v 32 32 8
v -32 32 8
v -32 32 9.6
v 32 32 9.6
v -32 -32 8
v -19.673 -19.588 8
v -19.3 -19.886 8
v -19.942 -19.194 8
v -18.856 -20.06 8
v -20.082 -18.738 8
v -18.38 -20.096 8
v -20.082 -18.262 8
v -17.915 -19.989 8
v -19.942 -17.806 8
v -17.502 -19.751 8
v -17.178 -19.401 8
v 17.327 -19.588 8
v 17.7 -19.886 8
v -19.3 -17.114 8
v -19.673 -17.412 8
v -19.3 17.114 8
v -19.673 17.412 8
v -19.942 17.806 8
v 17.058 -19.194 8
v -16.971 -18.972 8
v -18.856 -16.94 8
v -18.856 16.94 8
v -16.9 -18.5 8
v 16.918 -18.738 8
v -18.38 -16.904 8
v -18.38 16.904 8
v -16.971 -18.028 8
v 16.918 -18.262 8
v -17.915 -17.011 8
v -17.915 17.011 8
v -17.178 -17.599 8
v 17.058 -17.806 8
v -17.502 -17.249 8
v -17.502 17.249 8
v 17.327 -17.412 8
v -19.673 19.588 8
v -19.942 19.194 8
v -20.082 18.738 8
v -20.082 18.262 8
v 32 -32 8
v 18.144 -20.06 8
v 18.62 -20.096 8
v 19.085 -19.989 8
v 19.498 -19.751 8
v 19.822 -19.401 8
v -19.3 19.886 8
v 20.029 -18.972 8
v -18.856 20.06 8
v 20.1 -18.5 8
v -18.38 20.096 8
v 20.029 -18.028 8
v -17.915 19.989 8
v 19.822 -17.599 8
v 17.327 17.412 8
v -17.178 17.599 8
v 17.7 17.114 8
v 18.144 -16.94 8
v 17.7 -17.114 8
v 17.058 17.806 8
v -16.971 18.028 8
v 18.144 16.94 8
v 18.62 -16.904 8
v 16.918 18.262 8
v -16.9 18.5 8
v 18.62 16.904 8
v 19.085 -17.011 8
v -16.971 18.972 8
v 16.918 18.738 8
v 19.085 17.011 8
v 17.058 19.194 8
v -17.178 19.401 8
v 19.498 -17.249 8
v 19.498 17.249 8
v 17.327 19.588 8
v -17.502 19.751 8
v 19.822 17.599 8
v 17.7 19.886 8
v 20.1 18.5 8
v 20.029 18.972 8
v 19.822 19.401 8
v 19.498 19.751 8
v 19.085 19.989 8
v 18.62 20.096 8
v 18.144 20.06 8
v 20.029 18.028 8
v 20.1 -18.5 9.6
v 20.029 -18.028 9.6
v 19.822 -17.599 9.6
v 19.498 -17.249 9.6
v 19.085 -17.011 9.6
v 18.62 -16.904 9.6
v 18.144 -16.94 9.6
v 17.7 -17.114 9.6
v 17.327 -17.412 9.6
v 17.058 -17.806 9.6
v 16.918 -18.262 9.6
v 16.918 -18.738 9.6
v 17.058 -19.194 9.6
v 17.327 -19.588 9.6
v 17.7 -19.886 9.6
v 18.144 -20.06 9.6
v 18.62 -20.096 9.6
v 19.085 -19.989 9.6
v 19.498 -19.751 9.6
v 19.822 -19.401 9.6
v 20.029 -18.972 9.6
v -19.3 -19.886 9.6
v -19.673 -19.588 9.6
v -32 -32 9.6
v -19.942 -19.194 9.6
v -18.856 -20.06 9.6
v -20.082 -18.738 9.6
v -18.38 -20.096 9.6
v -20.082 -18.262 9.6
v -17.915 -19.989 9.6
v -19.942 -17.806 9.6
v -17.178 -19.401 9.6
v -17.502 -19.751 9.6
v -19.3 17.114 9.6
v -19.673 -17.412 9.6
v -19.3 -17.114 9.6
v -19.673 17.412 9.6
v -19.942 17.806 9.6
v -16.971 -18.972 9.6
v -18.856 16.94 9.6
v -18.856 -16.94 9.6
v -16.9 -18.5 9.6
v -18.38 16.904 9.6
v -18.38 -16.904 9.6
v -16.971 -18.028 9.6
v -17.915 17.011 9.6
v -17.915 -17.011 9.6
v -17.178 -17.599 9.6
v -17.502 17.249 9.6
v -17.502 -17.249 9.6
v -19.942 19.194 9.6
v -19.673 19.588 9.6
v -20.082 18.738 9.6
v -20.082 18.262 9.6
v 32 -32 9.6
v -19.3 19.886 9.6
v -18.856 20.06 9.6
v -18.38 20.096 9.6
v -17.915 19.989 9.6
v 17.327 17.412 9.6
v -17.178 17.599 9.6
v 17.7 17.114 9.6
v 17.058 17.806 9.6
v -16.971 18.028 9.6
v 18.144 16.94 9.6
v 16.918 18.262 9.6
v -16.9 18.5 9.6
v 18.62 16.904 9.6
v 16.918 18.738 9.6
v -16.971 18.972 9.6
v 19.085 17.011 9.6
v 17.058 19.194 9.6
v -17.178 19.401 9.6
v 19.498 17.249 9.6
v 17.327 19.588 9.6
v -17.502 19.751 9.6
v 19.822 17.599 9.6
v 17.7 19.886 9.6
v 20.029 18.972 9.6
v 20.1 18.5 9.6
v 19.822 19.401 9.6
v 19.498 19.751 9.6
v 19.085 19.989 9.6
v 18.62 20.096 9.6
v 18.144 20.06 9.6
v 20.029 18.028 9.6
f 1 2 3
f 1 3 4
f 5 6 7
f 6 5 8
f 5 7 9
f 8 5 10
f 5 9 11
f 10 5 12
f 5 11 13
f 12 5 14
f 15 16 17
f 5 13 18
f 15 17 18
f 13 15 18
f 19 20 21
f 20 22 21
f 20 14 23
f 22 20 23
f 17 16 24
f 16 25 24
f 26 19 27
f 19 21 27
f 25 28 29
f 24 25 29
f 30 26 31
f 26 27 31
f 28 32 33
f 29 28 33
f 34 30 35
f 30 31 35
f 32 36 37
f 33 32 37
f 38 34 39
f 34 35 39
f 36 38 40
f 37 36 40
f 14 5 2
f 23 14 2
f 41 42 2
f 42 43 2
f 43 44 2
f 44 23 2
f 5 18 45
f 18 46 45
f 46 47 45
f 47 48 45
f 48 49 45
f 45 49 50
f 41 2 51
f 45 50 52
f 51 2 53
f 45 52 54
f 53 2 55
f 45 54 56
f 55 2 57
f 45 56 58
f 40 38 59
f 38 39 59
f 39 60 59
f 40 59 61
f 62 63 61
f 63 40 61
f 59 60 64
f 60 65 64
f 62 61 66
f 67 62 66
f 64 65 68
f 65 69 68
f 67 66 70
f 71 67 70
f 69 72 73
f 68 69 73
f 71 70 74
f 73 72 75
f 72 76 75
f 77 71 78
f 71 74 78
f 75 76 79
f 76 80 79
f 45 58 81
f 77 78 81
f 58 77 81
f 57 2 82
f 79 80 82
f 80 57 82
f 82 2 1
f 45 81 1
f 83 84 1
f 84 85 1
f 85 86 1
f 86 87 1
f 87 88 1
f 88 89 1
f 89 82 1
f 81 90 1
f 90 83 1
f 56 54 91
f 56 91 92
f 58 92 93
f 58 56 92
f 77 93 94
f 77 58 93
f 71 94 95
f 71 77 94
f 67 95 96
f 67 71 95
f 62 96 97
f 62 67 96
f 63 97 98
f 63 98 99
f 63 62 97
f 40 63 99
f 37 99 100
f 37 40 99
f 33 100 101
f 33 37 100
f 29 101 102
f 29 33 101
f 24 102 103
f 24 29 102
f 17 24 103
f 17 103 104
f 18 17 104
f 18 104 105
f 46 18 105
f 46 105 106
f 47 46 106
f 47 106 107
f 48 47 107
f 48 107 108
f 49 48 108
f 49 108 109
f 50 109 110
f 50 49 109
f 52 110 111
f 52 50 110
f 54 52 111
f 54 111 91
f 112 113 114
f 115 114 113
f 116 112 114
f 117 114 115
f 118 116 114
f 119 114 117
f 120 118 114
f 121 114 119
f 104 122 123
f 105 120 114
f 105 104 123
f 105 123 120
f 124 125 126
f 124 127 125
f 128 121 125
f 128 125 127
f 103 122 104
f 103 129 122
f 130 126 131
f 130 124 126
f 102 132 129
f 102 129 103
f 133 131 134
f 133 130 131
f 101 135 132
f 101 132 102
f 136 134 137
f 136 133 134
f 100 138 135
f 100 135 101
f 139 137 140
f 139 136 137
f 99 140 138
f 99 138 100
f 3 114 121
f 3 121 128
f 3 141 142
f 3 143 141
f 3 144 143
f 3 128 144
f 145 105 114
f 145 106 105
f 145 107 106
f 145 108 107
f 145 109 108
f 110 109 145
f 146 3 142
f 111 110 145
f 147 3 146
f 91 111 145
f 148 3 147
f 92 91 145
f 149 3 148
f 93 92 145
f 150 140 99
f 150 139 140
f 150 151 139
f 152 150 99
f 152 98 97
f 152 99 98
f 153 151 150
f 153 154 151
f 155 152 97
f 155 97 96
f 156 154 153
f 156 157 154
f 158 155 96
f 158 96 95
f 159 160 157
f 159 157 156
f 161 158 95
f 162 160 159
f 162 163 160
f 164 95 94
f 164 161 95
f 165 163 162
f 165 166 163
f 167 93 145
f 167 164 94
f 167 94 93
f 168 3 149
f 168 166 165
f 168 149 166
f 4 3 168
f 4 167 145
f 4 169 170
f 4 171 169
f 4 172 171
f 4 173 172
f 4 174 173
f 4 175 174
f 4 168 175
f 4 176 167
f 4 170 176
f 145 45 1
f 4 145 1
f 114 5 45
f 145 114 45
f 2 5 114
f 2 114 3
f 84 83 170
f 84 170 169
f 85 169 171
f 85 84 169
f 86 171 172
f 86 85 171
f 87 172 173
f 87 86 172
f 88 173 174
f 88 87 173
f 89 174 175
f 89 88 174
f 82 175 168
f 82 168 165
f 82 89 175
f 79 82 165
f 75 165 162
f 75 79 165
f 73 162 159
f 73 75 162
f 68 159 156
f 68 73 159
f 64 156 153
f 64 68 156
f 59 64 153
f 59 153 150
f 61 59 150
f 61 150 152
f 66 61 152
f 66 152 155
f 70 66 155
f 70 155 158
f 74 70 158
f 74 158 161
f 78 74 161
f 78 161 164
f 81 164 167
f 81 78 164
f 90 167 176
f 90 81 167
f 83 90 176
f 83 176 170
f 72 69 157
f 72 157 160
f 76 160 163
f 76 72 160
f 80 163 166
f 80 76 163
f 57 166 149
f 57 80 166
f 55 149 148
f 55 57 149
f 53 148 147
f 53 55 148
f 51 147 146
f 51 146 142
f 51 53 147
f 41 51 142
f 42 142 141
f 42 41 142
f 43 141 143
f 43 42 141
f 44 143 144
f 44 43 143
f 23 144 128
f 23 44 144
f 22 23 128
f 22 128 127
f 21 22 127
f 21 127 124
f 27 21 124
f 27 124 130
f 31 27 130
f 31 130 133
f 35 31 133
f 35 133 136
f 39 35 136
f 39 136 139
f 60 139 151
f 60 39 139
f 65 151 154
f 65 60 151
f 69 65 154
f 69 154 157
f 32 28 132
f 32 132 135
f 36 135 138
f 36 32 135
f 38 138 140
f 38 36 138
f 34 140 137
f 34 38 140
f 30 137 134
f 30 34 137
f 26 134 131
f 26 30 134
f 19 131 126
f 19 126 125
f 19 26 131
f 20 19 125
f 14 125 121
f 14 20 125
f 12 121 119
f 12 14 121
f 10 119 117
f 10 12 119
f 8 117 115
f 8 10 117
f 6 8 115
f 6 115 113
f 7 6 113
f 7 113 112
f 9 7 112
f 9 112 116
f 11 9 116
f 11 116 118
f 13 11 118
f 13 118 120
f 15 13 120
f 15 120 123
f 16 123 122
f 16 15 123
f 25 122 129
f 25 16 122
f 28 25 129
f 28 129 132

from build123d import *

# Parameters (mm, degrees)
PCB_1_6_START         = 8
SKETCH_1_W            = 64
SKETCH_1_H            = 64
PCB_1_6_DEPTH         = 1.6
CUT_EXTRUDE_START     = 8
SKETCH_2_R            = 1.6
CUT_EXTRUDE_451_DEPTH = 1.6


with BuildPart() as part:
    # 草图1 → PCB外廓参考_板厚暂按1.6 (new body)
    with BuildSketch(Plane.XY.offset(PCB_1_6_START)):
        Rectangle(SKETCH_1_W, SKETCH_1_H)
    extrude(amount=PCB_1_6_DEPTH)

    # 草图2 → Cut-Extrude 451 (cut)
    with BuildSketch(Plane.XY.offset(CUT_EXTRUDE_START)):
        with Locations((-18.5, -18.5)):
            Circle(SKETCH_2_R)
        with Locations((-18.5, 18.5)):
            Circle(SKETCH_2_R)
        with Locations((18.5, -18.5)):
            Circle(SKETCH_2_R)
        with Locations((18.5, 18.5)):
            Circle(SKETCH_2_R)
    extrude(amount=CUT_EXTRUDE_451_DEPTH, mode=Mode.SUBTRACT)


solid = part.part
